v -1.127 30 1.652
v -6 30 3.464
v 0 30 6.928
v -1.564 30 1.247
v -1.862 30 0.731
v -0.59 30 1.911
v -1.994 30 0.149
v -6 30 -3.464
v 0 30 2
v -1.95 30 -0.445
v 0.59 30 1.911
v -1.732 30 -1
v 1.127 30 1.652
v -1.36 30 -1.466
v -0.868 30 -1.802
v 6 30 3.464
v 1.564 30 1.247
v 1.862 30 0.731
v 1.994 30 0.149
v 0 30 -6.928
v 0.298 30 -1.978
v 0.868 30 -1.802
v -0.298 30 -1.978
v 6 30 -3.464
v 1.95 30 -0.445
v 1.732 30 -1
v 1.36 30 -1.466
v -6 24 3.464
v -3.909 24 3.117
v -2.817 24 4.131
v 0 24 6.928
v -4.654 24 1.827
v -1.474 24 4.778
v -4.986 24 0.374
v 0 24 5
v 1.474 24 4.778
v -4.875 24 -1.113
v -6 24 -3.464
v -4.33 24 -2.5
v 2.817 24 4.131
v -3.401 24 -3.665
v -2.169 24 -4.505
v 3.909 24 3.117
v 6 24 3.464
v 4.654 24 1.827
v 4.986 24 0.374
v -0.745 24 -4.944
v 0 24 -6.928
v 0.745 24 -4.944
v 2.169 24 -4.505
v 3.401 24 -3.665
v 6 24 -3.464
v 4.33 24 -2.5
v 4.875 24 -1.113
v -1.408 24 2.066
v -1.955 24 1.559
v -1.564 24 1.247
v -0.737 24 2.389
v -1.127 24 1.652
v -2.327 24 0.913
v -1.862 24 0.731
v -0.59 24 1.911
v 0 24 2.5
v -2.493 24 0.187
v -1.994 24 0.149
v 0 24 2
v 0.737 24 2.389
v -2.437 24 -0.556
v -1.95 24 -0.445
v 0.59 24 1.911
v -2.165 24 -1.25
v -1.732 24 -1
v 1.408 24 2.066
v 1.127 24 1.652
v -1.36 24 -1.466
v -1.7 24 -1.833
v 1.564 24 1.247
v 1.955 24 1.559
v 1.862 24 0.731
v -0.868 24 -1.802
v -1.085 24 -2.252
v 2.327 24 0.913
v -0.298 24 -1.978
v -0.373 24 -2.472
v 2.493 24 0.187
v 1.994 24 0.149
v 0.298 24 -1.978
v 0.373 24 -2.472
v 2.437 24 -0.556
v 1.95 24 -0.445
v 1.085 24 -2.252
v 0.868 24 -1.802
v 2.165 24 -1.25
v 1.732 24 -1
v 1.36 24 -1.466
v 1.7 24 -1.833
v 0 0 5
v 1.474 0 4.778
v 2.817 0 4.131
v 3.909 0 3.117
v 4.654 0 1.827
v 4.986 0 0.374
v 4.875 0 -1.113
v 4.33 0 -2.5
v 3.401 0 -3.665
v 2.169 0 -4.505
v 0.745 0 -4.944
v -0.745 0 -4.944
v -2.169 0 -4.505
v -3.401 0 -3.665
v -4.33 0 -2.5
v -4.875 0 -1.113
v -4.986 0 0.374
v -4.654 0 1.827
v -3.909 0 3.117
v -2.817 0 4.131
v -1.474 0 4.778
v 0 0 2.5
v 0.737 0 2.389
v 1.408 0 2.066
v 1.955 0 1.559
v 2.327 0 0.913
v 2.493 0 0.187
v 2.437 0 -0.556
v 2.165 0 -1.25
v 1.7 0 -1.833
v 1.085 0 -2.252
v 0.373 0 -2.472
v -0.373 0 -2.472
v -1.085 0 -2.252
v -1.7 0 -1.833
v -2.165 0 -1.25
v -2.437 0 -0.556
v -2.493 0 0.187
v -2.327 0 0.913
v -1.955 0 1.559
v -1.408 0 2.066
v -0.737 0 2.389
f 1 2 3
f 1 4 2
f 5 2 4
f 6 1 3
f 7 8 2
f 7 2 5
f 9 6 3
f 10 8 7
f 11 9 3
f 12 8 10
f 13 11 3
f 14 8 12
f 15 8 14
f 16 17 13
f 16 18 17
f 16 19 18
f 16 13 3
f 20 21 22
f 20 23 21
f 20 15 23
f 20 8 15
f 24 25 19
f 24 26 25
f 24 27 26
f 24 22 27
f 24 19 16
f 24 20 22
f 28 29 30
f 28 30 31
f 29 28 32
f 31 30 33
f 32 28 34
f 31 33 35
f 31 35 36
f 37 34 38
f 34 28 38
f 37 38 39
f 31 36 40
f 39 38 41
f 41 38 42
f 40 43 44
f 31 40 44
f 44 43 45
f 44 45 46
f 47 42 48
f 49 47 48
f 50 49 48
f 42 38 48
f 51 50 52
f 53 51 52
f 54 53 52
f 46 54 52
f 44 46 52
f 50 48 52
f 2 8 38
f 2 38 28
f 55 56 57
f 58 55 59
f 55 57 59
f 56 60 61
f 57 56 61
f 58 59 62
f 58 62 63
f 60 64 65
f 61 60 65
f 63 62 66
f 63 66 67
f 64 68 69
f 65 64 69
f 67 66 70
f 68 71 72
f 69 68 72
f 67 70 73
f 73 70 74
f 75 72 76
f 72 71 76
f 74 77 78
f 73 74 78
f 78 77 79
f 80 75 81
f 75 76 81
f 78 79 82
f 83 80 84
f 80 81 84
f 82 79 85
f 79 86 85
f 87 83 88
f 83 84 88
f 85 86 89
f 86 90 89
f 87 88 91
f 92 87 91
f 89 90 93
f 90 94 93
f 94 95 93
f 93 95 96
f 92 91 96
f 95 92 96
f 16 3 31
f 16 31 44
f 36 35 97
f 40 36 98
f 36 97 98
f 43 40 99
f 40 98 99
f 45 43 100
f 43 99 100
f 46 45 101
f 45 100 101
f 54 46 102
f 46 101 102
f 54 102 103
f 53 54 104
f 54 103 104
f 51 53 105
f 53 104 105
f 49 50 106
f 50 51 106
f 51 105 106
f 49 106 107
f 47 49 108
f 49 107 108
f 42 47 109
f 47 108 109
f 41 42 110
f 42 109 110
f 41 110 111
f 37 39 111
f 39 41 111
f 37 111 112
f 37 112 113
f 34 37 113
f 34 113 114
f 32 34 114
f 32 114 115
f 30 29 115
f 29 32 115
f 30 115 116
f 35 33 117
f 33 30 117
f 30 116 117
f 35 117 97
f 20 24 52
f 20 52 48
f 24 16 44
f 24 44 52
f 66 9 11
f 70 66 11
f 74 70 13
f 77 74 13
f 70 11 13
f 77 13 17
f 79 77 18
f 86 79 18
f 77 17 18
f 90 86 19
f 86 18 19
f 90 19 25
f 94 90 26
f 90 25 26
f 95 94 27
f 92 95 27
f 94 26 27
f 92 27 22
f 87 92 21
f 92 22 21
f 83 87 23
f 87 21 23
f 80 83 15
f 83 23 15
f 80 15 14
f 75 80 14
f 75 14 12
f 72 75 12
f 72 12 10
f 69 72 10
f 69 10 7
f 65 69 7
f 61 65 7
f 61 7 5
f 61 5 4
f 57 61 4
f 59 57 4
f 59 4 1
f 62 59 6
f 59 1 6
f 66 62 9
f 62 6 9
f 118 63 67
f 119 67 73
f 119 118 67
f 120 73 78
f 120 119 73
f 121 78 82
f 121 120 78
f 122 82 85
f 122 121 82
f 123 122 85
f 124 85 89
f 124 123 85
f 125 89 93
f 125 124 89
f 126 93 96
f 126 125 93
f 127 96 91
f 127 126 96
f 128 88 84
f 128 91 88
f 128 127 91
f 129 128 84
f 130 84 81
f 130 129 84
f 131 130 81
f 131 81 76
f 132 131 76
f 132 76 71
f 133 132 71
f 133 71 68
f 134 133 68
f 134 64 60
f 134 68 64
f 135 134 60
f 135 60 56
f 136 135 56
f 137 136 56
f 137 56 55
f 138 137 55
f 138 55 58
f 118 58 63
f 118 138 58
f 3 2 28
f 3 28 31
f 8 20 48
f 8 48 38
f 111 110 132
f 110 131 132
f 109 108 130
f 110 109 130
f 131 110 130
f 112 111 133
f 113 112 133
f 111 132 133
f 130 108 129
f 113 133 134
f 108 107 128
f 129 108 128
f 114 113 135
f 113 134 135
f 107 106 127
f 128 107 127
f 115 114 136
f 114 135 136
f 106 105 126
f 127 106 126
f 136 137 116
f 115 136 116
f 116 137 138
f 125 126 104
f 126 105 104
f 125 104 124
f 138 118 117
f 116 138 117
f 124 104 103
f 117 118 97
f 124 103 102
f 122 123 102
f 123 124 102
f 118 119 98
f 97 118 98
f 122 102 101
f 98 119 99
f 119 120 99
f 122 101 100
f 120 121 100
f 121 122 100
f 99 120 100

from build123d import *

# Parameters (mm, degrees)
SKETCH_1_R      = 5
SKETCH_1_R_2    = 2.5
EXTRUDE_1_DEPTH = 30
SKETCH_2_R      = 2
EXTRUDE_2_DEPTH = 6


with BuildPart() as part:
    # 草图1 → 凸台-拉伸1 (new body)
    with BuildSketch(Plane(origin=(0, 0, 0), x_dir=(1, 0, 0), z_dir=(0, 1, 0))):
        with Locations(Location((0, 0, 0), (0, 0, 270))):
            Circle(SKETCH_1_R)
        with Locations(Location((0, 0, 0), (0, 0, 270))):
            Circle(SKETCH_1_R_2, mode=Mode.SUBTRACT)
    extrude(amount=EXTRUDE_1_DEPTH)

    # 草图2 → 凸台-拉伸2 (add)
    with BuildSketch(Plane(origin=(0, 30, 0), x_dir=(1, 0, 0), z_dir=(0, 1, 0))):
        Polygon((0, 6.92820323), (-6, 3.464101615), (-6, -3.464101615), (0, -6.92820323), (6, -3.464101615), (6, 3.464101615), align=None)
        with Locations(Location((0, 0, 0), (0, 0, 270))):
            Circle(SKETCH_2_R, mode=Mode.SUBTRACT)
    extrude(amount=-EXTRUDE_2_DEPTH)


solid = part.part
